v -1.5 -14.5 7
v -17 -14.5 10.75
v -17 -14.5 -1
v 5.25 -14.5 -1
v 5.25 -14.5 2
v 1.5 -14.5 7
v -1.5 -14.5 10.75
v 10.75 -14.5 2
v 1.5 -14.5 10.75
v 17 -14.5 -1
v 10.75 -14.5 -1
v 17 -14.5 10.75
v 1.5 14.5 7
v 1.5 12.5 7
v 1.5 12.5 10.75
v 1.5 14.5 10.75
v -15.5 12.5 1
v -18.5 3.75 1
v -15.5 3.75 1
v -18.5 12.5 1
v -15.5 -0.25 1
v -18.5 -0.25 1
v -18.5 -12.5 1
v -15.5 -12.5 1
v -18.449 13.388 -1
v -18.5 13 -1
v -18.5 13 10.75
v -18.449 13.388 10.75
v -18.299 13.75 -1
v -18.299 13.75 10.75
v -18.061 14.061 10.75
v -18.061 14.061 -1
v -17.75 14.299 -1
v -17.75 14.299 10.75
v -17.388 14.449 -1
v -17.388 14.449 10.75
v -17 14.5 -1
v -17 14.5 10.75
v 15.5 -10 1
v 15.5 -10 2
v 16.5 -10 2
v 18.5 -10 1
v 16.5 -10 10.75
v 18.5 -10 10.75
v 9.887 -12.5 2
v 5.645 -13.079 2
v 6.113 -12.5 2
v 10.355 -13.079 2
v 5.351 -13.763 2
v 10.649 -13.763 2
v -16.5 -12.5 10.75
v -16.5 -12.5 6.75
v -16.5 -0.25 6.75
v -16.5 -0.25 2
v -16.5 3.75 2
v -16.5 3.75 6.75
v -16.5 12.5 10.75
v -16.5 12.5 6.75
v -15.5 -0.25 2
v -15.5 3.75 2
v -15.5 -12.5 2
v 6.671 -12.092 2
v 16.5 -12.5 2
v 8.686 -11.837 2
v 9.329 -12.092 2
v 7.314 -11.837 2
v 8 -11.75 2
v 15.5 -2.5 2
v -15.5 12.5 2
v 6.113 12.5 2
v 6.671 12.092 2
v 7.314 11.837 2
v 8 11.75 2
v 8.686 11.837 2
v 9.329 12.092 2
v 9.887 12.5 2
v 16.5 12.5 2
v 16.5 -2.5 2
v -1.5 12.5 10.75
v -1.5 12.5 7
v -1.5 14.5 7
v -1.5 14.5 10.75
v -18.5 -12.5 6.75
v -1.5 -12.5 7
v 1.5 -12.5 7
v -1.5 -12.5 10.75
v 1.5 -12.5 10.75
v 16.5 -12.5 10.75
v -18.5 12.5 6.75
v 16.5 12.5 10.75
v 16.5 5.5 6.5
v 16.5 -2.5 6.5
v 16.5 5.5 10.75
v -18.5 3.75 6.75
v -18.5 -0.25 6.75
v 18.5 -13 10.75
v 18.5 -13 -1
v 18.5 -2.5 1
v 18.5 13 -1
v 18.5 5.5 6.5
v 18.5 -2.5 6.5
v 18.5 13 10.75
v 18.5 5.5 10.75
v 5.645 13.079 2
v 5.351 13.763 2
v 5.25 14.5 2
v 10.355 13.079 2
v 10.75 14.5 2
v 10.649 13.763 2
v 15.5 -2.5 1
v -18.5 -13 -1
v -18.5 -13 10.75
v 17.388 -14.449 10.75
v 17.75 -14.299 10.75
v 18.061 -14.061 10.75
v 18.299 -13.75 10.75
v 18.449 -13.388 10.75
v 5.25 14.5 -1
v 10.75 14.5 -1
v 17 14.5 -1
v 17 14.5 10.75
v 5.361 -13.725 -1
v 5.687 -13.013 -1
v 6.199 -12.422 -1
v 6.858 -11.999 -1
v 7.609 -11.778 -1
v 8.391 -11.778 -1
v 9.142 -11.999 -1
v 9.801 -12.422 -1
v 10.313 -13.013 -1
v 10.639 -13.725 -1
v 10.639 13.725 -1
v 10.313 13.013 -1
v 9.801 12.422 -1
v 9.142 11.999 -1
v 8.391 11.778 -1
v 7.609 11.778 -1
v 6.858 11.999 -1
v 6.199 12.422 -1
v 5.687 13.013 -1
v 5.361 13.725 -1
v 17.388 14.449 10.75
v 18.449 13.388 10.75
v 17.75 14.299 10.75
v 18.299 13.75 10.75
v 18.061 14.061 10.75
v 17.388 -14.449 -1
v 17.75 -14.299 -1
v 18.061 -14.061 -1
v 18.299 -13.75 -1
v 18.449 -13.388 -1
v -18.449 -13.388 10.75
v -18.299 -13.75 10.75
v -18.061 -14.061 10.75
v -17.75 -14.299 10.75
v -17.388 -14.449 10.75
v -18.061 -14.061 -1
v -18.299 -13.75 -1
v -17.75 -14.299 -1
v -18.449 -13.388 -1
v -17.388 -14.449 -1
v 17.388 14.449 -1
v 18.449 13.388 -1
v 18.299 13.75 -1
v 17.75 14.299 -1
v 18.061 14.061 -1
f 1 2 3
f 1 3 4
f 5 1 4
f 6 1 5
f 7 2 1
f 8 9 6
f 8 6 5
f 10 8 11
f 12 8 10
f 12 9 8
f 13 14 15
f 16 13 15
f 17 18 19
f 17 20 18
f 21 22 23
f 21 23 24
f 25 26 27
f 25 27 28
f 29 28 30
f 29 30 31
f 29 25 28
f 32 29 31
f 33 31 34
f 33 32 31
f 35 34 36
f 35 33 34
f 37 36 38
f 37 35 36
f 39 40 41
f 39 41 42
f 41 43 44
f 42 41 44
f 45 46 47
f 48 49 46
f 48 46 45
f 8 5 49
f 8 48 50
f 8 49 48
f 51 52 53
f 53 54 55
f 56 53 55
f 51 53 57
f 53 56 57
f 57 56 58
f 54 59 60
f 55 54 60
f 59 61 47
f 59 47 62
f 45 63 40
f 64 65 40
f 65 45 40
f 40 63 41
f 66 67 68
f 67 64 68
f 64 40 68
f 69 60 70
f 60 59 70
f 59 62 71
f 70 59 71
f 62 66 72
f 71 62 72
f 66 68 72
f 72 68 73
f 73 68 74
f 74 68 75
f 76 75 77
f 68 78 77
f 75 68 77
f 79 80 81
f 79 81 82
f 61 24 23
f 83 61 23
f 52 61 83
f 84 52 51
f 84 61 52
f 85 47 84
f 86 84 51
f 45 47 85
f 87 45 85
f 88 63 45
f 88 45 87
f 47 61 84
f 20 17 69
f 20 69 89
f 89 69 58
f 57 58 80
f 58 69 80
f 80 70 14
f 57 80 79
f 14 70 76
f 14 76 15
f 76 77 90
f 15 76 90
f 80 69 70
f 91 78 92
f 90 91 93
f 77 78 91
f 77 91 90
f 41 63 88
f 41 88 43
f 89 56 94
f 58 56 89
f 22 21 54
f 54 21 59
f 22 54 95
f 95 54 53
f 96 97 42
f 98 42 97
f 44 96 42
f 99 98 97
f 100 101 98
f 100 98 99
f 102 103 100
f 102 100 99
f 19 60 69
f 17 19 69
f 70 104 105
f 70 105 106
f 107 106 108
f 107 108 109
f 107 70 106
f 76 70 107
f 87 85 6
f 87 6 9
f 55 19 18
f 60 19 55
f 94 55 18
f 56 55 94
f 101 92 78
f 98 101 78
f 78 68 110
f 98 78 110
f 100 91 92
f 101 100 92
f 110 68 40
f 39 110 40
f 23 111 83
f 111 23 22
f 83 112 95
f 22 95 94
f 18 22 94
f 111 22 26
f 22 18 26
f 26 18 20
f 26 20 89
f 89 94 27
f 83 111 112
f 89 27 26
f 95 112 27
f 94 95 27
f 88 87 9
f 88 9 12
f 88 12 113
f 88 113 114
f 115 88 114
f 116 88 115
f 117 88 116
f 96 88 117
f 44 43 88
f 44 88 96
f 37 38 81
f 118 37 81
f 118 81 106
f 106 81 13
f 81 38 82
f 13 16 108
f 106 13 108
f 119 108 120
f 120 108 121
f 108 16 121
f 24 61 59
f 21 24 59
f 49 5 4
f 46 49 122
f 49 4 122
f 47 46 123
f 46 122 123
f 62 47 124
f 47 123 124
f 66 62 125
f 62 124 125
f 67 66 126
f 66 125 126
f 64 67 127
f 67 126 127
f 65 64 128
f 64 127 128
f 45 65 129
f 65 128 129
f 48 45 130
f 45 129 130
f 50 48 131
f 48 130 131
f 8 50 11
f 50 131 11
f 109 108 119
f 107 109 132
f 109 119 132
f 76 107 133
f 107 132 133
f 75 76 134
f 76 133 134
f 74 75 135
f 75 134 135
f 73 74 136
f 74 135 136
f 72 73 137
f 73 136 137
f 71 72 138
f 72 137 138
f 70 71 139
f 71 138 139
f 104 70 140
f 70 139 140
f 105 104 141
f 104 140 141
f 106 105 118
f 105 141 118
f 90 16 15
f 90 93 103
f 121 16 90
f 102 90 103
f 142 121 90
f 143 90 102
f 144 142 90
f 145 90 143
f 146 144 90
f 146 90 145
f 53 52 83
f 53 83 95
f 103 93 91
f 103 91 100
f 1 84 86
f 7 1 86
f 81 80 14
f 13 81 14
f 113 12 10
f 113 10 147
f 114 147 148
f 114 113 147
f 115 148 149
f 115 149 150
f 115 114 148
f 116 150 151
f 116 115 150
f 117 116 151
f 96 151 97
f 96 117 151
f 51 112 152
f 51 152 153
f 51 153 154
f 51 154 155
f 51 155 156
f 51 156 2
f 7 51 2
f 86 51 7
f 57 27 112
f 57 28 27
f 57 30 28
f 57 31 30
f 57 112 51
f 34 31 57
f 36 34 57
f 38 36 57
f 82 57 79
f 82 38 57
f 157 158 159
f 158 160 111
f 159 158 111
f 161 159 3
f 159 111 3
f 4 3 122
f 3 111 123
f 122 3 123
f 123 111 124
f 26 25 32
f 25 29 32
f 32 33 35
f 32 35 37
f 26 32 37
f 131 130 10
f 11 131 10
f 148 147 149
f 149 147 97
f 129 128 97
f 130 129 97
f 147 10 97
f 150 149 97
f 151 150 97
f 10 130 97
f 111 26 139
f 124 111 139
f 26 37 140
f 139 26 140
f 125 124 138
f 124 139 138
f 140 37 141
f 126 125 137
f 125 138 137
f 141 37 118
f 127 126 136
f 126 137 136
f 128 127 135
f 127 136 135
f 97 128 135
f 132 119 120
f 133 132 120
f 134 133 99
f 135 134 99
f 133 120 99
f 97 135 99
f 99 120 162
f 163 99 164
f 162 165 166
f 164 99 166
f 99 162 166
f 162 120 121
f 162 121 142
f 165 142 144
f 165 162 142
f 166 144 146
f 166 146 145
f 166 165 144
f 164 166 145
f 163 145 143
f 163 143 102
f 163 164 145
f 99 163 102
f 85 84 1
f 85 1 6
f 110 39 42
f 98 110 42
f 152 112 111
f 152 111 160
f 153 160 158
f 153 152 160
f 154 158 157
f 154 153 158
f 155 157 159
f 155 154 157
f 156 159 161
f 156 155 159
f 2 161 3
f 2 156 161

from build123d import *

# Parameters (mm, degrees)
F0_W      = 37
F0_H      = 29
F0_W_2    = 33
F0_H_2    = 25
F1_DEPTH  = 12
F2_DEPTH  = 2
F4_DEPTH  = 2
F6_DEPTH  = 1
F7_W      = 8.75
F7_H      = 4.75
F7_W_2    = 12.25
F8_DEPTH  = 2
F10_DEPTH = 1
F11_DEPTH = 1
F13_DEPTH = 3
F14_R     = 1.5
F15_W     = 3
F15_H     = 3.5
F16_DEPTH = 27
F17_DEPTH = 2
F18_DEPTH = 0.5
F19_DEPTH = 1.25
F20_DEPTH = 1.5


with BuildPart() as f1:
    # F0 (on Top) → F1 (new body)
    with BuildSketch(Plane.XY):
        Rectangle(F0_W, F0_H)
        Rectangle(F0_W_2, F0_H_2, mode=Mode.SUBTRACT)
    extrude(amount=F1_DEPTH)

    # F0 (on Top) → F2 (join)
    with BuildSketch(Plane.XY):
        Rectangle(F0_W_2, F0_H_2)
    extrude(amount=F2_DEPTH)

    # F3 (on face) → F4 (cut)
    with BuildSketch(Plane(origin=(16.5, 0, 0), x_dir=(0, -1, 0), z_dir=(-1, 0, 0))):
        Polygon((2.5, 2), (10, 2), (10, 12), (-5.5, 12), (-5.5, 7), (2.5, 7), align=None)
    extrude(amount=-F4_DEPTH, mode=Mode.SUBTRACT)

    # F5 (on face) → F6 (cut)
    with BuildSketch(Plane.XY.offset(2)):
        Polygon((15.5, -10), (16.5, -10), (18.5, -10), (18.5, -2.5), (16.5, -2.5), (15.5, -2.5), align=None)
    extrude(amount=-F6_DEPTH, mode=Mode.SUBTRACT)

    # F7 (on face) → F8 (cut)
    with BuildSketch(Plane.YZ.offset(-16.5)):
        with Locations((8.125, 4.375)):
            Rectangle(F7_W, F7_H)
        with Locations((-6.375, 4.375)):
            Rectangle(F7_W_2, F7_H)
    extrude(amount=-F8_DEPTH, mode=Mode.SUBTRACT)

    # F9 (on face) → F10 (cut)
    with BuildSketch(Plane.XY.offset(2)):
        Polygon((-18.5, 3.75), (-16.5, 3.75), (-15.5, 3.75), (-15.5, 12.5), (-18.5, 12.5), align=None)
        Polygon((-15.5, -0.25), (-16.5, -0.25), (-18.5, -0.25), (-18.5, -12.5), (-15.5, -12.5), align=None)
    extrude(amount=-F10_DEPTH, mode=Mode.SUBTRACT)

    # F11 (add): a face of the model
    f11_faces = [f1.faces().sort_by_distance(p)[0] for p in [
        (0, 0, 0),
    ]]
    extrude(f11_faces, amount=F11_DEPTH)

    # F12 (on face) → F13 (cut)
    with BuildSketch(Plane(origin=(0, 0, -1), x_dir=(1, 0, 0), z_dir=(0, 0, -1))):
        with BuildLine():
            ThreePointArc((5.25, 14.5), (8, 11.75), (10.75, 14.5))
            Line((10.75, 14.5), (8, 14.5))
            Line((8, 14.5), (5.25, 14.5))
        make_face()
        with BuildLine():
            Line((8, -14.5), (10.75, -14.5))
            ThreePointArc((10.75, -14.5), (8, -11.75), (5.25, -14.5))
            Line((5.25, -14.5), (8, -14.5))
        make_face()
    extrude(amount=-F13_DEPTH, mode=Mode.SUBTRACT)

    # F14
    f14_edges = [f1.edges().sort_by_distance(p)[0] for p in [
        (-18.5, -14.5, 5.5),
        (18.5, -14.5, 5.5),
        (18.5, 14.5, 5.5),
        (-18.5, 14.5, 5.5),
    ]]
    fillet(f14_edges, radius=F14_R)

    # F15 (on face) → F16 (cut)
    with BuildSketch(Plane.XZ.offset(-12.5)):
        with Locations((0, 10.25)):
            Rectangle(F15_W, F15_H)
    extrude(amount=F16_DEPTH, mode=Mode.SUBTRACT)

    # F15 (on face) → F17 (cut)
    with BuildSketch(Plane.XZ.offset(-12.5)):
        with Locations((0, 10.25)):
            Rectangle(F15_W, F15_H)
    extrude(amount=-F17_DEPTH, mode=Mode.SUBTRACT)

    # F18 (cut): a face of the model
    f18_faces = [f1.faces().sort_by_distance(p)[0] for p in [
        (17.5, 1.5, 7),
    ]]
    extrude(f18_faces, amount=-F18_DEPTH, mode=Mode.SUBTRACT)

    # F19 (cut): faces of the model
    f19_faces = [f1.faces().sort_by_distance(p)[0] for p in [
        (10.8712359215, -13.1995864394, 12),
        (9.25, 14.3076461594, 12),
        (-17.8229628853, -13.8229628853, 12),
    ]]
    extrude(f19_faces, amount=-F19_DEPTH, mode=Mode.SUBTRACT)

    # F20 (cut): faces of the model
    f20_faces = [f1.faces().sort_by_distance(p)[0] for p in [
        (0, -13.5, 8.5),
        (0, 13.5, 8.5),
    ]]
    extrude(f20_faces, amount=-F20_DEPTH, mode=Mode.SUBTRACT)


solid = f1.part
